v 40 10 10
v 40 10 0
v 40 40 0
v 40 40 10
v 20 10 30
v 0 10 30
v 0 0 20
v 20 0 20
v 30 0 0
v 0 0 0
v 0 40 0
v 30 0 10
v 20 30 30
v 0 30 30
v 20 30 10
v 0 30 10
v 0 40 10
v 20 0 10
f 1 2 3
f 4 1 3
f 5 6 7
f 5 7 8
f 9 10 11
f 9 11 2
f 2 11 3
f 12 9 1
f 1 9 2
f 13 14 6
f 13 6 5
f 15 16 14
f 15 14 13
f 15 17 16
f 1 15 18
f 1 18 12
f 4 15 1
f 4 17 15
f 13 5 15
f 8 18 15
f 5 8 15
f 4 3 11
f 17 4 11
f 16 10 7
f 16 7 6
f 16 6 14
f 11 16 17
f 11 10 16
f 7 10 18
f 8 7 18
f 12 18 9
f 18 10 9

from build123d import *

# Parameters (mm, degrees)
F0_W     = 20
F0_H     = 30
F1_DEPTH = 30
F2_DEPTH = 10
F3_SIZE  = 10


with BuildPart() as f1:
    # F0 (on Top) → F1 (new body)
    with BuildSketch(Plane.XY):
        with Locations((10, 15)):
            Rectangle(F0_W, F0_H)
    extrude(amount=F1_DEPTH)

    # F0 (on Top) → F2 (join)
    with BuildSketch(Plane.XY):
        Polygon((20, 30), (20, 0), (30, 0), (40, 10), (40, 40), (0, 40), (0, 30), align=None)
    extrude(amount=F2_DEPTH)

    # F3
    f3_edges = [f1.edges().sort_by_distance(p)[0] for p in [
        (10, 0, 30),
    ]]
    chamfer(f3_edges, length=F3_SIZE)


solid = f1.part
